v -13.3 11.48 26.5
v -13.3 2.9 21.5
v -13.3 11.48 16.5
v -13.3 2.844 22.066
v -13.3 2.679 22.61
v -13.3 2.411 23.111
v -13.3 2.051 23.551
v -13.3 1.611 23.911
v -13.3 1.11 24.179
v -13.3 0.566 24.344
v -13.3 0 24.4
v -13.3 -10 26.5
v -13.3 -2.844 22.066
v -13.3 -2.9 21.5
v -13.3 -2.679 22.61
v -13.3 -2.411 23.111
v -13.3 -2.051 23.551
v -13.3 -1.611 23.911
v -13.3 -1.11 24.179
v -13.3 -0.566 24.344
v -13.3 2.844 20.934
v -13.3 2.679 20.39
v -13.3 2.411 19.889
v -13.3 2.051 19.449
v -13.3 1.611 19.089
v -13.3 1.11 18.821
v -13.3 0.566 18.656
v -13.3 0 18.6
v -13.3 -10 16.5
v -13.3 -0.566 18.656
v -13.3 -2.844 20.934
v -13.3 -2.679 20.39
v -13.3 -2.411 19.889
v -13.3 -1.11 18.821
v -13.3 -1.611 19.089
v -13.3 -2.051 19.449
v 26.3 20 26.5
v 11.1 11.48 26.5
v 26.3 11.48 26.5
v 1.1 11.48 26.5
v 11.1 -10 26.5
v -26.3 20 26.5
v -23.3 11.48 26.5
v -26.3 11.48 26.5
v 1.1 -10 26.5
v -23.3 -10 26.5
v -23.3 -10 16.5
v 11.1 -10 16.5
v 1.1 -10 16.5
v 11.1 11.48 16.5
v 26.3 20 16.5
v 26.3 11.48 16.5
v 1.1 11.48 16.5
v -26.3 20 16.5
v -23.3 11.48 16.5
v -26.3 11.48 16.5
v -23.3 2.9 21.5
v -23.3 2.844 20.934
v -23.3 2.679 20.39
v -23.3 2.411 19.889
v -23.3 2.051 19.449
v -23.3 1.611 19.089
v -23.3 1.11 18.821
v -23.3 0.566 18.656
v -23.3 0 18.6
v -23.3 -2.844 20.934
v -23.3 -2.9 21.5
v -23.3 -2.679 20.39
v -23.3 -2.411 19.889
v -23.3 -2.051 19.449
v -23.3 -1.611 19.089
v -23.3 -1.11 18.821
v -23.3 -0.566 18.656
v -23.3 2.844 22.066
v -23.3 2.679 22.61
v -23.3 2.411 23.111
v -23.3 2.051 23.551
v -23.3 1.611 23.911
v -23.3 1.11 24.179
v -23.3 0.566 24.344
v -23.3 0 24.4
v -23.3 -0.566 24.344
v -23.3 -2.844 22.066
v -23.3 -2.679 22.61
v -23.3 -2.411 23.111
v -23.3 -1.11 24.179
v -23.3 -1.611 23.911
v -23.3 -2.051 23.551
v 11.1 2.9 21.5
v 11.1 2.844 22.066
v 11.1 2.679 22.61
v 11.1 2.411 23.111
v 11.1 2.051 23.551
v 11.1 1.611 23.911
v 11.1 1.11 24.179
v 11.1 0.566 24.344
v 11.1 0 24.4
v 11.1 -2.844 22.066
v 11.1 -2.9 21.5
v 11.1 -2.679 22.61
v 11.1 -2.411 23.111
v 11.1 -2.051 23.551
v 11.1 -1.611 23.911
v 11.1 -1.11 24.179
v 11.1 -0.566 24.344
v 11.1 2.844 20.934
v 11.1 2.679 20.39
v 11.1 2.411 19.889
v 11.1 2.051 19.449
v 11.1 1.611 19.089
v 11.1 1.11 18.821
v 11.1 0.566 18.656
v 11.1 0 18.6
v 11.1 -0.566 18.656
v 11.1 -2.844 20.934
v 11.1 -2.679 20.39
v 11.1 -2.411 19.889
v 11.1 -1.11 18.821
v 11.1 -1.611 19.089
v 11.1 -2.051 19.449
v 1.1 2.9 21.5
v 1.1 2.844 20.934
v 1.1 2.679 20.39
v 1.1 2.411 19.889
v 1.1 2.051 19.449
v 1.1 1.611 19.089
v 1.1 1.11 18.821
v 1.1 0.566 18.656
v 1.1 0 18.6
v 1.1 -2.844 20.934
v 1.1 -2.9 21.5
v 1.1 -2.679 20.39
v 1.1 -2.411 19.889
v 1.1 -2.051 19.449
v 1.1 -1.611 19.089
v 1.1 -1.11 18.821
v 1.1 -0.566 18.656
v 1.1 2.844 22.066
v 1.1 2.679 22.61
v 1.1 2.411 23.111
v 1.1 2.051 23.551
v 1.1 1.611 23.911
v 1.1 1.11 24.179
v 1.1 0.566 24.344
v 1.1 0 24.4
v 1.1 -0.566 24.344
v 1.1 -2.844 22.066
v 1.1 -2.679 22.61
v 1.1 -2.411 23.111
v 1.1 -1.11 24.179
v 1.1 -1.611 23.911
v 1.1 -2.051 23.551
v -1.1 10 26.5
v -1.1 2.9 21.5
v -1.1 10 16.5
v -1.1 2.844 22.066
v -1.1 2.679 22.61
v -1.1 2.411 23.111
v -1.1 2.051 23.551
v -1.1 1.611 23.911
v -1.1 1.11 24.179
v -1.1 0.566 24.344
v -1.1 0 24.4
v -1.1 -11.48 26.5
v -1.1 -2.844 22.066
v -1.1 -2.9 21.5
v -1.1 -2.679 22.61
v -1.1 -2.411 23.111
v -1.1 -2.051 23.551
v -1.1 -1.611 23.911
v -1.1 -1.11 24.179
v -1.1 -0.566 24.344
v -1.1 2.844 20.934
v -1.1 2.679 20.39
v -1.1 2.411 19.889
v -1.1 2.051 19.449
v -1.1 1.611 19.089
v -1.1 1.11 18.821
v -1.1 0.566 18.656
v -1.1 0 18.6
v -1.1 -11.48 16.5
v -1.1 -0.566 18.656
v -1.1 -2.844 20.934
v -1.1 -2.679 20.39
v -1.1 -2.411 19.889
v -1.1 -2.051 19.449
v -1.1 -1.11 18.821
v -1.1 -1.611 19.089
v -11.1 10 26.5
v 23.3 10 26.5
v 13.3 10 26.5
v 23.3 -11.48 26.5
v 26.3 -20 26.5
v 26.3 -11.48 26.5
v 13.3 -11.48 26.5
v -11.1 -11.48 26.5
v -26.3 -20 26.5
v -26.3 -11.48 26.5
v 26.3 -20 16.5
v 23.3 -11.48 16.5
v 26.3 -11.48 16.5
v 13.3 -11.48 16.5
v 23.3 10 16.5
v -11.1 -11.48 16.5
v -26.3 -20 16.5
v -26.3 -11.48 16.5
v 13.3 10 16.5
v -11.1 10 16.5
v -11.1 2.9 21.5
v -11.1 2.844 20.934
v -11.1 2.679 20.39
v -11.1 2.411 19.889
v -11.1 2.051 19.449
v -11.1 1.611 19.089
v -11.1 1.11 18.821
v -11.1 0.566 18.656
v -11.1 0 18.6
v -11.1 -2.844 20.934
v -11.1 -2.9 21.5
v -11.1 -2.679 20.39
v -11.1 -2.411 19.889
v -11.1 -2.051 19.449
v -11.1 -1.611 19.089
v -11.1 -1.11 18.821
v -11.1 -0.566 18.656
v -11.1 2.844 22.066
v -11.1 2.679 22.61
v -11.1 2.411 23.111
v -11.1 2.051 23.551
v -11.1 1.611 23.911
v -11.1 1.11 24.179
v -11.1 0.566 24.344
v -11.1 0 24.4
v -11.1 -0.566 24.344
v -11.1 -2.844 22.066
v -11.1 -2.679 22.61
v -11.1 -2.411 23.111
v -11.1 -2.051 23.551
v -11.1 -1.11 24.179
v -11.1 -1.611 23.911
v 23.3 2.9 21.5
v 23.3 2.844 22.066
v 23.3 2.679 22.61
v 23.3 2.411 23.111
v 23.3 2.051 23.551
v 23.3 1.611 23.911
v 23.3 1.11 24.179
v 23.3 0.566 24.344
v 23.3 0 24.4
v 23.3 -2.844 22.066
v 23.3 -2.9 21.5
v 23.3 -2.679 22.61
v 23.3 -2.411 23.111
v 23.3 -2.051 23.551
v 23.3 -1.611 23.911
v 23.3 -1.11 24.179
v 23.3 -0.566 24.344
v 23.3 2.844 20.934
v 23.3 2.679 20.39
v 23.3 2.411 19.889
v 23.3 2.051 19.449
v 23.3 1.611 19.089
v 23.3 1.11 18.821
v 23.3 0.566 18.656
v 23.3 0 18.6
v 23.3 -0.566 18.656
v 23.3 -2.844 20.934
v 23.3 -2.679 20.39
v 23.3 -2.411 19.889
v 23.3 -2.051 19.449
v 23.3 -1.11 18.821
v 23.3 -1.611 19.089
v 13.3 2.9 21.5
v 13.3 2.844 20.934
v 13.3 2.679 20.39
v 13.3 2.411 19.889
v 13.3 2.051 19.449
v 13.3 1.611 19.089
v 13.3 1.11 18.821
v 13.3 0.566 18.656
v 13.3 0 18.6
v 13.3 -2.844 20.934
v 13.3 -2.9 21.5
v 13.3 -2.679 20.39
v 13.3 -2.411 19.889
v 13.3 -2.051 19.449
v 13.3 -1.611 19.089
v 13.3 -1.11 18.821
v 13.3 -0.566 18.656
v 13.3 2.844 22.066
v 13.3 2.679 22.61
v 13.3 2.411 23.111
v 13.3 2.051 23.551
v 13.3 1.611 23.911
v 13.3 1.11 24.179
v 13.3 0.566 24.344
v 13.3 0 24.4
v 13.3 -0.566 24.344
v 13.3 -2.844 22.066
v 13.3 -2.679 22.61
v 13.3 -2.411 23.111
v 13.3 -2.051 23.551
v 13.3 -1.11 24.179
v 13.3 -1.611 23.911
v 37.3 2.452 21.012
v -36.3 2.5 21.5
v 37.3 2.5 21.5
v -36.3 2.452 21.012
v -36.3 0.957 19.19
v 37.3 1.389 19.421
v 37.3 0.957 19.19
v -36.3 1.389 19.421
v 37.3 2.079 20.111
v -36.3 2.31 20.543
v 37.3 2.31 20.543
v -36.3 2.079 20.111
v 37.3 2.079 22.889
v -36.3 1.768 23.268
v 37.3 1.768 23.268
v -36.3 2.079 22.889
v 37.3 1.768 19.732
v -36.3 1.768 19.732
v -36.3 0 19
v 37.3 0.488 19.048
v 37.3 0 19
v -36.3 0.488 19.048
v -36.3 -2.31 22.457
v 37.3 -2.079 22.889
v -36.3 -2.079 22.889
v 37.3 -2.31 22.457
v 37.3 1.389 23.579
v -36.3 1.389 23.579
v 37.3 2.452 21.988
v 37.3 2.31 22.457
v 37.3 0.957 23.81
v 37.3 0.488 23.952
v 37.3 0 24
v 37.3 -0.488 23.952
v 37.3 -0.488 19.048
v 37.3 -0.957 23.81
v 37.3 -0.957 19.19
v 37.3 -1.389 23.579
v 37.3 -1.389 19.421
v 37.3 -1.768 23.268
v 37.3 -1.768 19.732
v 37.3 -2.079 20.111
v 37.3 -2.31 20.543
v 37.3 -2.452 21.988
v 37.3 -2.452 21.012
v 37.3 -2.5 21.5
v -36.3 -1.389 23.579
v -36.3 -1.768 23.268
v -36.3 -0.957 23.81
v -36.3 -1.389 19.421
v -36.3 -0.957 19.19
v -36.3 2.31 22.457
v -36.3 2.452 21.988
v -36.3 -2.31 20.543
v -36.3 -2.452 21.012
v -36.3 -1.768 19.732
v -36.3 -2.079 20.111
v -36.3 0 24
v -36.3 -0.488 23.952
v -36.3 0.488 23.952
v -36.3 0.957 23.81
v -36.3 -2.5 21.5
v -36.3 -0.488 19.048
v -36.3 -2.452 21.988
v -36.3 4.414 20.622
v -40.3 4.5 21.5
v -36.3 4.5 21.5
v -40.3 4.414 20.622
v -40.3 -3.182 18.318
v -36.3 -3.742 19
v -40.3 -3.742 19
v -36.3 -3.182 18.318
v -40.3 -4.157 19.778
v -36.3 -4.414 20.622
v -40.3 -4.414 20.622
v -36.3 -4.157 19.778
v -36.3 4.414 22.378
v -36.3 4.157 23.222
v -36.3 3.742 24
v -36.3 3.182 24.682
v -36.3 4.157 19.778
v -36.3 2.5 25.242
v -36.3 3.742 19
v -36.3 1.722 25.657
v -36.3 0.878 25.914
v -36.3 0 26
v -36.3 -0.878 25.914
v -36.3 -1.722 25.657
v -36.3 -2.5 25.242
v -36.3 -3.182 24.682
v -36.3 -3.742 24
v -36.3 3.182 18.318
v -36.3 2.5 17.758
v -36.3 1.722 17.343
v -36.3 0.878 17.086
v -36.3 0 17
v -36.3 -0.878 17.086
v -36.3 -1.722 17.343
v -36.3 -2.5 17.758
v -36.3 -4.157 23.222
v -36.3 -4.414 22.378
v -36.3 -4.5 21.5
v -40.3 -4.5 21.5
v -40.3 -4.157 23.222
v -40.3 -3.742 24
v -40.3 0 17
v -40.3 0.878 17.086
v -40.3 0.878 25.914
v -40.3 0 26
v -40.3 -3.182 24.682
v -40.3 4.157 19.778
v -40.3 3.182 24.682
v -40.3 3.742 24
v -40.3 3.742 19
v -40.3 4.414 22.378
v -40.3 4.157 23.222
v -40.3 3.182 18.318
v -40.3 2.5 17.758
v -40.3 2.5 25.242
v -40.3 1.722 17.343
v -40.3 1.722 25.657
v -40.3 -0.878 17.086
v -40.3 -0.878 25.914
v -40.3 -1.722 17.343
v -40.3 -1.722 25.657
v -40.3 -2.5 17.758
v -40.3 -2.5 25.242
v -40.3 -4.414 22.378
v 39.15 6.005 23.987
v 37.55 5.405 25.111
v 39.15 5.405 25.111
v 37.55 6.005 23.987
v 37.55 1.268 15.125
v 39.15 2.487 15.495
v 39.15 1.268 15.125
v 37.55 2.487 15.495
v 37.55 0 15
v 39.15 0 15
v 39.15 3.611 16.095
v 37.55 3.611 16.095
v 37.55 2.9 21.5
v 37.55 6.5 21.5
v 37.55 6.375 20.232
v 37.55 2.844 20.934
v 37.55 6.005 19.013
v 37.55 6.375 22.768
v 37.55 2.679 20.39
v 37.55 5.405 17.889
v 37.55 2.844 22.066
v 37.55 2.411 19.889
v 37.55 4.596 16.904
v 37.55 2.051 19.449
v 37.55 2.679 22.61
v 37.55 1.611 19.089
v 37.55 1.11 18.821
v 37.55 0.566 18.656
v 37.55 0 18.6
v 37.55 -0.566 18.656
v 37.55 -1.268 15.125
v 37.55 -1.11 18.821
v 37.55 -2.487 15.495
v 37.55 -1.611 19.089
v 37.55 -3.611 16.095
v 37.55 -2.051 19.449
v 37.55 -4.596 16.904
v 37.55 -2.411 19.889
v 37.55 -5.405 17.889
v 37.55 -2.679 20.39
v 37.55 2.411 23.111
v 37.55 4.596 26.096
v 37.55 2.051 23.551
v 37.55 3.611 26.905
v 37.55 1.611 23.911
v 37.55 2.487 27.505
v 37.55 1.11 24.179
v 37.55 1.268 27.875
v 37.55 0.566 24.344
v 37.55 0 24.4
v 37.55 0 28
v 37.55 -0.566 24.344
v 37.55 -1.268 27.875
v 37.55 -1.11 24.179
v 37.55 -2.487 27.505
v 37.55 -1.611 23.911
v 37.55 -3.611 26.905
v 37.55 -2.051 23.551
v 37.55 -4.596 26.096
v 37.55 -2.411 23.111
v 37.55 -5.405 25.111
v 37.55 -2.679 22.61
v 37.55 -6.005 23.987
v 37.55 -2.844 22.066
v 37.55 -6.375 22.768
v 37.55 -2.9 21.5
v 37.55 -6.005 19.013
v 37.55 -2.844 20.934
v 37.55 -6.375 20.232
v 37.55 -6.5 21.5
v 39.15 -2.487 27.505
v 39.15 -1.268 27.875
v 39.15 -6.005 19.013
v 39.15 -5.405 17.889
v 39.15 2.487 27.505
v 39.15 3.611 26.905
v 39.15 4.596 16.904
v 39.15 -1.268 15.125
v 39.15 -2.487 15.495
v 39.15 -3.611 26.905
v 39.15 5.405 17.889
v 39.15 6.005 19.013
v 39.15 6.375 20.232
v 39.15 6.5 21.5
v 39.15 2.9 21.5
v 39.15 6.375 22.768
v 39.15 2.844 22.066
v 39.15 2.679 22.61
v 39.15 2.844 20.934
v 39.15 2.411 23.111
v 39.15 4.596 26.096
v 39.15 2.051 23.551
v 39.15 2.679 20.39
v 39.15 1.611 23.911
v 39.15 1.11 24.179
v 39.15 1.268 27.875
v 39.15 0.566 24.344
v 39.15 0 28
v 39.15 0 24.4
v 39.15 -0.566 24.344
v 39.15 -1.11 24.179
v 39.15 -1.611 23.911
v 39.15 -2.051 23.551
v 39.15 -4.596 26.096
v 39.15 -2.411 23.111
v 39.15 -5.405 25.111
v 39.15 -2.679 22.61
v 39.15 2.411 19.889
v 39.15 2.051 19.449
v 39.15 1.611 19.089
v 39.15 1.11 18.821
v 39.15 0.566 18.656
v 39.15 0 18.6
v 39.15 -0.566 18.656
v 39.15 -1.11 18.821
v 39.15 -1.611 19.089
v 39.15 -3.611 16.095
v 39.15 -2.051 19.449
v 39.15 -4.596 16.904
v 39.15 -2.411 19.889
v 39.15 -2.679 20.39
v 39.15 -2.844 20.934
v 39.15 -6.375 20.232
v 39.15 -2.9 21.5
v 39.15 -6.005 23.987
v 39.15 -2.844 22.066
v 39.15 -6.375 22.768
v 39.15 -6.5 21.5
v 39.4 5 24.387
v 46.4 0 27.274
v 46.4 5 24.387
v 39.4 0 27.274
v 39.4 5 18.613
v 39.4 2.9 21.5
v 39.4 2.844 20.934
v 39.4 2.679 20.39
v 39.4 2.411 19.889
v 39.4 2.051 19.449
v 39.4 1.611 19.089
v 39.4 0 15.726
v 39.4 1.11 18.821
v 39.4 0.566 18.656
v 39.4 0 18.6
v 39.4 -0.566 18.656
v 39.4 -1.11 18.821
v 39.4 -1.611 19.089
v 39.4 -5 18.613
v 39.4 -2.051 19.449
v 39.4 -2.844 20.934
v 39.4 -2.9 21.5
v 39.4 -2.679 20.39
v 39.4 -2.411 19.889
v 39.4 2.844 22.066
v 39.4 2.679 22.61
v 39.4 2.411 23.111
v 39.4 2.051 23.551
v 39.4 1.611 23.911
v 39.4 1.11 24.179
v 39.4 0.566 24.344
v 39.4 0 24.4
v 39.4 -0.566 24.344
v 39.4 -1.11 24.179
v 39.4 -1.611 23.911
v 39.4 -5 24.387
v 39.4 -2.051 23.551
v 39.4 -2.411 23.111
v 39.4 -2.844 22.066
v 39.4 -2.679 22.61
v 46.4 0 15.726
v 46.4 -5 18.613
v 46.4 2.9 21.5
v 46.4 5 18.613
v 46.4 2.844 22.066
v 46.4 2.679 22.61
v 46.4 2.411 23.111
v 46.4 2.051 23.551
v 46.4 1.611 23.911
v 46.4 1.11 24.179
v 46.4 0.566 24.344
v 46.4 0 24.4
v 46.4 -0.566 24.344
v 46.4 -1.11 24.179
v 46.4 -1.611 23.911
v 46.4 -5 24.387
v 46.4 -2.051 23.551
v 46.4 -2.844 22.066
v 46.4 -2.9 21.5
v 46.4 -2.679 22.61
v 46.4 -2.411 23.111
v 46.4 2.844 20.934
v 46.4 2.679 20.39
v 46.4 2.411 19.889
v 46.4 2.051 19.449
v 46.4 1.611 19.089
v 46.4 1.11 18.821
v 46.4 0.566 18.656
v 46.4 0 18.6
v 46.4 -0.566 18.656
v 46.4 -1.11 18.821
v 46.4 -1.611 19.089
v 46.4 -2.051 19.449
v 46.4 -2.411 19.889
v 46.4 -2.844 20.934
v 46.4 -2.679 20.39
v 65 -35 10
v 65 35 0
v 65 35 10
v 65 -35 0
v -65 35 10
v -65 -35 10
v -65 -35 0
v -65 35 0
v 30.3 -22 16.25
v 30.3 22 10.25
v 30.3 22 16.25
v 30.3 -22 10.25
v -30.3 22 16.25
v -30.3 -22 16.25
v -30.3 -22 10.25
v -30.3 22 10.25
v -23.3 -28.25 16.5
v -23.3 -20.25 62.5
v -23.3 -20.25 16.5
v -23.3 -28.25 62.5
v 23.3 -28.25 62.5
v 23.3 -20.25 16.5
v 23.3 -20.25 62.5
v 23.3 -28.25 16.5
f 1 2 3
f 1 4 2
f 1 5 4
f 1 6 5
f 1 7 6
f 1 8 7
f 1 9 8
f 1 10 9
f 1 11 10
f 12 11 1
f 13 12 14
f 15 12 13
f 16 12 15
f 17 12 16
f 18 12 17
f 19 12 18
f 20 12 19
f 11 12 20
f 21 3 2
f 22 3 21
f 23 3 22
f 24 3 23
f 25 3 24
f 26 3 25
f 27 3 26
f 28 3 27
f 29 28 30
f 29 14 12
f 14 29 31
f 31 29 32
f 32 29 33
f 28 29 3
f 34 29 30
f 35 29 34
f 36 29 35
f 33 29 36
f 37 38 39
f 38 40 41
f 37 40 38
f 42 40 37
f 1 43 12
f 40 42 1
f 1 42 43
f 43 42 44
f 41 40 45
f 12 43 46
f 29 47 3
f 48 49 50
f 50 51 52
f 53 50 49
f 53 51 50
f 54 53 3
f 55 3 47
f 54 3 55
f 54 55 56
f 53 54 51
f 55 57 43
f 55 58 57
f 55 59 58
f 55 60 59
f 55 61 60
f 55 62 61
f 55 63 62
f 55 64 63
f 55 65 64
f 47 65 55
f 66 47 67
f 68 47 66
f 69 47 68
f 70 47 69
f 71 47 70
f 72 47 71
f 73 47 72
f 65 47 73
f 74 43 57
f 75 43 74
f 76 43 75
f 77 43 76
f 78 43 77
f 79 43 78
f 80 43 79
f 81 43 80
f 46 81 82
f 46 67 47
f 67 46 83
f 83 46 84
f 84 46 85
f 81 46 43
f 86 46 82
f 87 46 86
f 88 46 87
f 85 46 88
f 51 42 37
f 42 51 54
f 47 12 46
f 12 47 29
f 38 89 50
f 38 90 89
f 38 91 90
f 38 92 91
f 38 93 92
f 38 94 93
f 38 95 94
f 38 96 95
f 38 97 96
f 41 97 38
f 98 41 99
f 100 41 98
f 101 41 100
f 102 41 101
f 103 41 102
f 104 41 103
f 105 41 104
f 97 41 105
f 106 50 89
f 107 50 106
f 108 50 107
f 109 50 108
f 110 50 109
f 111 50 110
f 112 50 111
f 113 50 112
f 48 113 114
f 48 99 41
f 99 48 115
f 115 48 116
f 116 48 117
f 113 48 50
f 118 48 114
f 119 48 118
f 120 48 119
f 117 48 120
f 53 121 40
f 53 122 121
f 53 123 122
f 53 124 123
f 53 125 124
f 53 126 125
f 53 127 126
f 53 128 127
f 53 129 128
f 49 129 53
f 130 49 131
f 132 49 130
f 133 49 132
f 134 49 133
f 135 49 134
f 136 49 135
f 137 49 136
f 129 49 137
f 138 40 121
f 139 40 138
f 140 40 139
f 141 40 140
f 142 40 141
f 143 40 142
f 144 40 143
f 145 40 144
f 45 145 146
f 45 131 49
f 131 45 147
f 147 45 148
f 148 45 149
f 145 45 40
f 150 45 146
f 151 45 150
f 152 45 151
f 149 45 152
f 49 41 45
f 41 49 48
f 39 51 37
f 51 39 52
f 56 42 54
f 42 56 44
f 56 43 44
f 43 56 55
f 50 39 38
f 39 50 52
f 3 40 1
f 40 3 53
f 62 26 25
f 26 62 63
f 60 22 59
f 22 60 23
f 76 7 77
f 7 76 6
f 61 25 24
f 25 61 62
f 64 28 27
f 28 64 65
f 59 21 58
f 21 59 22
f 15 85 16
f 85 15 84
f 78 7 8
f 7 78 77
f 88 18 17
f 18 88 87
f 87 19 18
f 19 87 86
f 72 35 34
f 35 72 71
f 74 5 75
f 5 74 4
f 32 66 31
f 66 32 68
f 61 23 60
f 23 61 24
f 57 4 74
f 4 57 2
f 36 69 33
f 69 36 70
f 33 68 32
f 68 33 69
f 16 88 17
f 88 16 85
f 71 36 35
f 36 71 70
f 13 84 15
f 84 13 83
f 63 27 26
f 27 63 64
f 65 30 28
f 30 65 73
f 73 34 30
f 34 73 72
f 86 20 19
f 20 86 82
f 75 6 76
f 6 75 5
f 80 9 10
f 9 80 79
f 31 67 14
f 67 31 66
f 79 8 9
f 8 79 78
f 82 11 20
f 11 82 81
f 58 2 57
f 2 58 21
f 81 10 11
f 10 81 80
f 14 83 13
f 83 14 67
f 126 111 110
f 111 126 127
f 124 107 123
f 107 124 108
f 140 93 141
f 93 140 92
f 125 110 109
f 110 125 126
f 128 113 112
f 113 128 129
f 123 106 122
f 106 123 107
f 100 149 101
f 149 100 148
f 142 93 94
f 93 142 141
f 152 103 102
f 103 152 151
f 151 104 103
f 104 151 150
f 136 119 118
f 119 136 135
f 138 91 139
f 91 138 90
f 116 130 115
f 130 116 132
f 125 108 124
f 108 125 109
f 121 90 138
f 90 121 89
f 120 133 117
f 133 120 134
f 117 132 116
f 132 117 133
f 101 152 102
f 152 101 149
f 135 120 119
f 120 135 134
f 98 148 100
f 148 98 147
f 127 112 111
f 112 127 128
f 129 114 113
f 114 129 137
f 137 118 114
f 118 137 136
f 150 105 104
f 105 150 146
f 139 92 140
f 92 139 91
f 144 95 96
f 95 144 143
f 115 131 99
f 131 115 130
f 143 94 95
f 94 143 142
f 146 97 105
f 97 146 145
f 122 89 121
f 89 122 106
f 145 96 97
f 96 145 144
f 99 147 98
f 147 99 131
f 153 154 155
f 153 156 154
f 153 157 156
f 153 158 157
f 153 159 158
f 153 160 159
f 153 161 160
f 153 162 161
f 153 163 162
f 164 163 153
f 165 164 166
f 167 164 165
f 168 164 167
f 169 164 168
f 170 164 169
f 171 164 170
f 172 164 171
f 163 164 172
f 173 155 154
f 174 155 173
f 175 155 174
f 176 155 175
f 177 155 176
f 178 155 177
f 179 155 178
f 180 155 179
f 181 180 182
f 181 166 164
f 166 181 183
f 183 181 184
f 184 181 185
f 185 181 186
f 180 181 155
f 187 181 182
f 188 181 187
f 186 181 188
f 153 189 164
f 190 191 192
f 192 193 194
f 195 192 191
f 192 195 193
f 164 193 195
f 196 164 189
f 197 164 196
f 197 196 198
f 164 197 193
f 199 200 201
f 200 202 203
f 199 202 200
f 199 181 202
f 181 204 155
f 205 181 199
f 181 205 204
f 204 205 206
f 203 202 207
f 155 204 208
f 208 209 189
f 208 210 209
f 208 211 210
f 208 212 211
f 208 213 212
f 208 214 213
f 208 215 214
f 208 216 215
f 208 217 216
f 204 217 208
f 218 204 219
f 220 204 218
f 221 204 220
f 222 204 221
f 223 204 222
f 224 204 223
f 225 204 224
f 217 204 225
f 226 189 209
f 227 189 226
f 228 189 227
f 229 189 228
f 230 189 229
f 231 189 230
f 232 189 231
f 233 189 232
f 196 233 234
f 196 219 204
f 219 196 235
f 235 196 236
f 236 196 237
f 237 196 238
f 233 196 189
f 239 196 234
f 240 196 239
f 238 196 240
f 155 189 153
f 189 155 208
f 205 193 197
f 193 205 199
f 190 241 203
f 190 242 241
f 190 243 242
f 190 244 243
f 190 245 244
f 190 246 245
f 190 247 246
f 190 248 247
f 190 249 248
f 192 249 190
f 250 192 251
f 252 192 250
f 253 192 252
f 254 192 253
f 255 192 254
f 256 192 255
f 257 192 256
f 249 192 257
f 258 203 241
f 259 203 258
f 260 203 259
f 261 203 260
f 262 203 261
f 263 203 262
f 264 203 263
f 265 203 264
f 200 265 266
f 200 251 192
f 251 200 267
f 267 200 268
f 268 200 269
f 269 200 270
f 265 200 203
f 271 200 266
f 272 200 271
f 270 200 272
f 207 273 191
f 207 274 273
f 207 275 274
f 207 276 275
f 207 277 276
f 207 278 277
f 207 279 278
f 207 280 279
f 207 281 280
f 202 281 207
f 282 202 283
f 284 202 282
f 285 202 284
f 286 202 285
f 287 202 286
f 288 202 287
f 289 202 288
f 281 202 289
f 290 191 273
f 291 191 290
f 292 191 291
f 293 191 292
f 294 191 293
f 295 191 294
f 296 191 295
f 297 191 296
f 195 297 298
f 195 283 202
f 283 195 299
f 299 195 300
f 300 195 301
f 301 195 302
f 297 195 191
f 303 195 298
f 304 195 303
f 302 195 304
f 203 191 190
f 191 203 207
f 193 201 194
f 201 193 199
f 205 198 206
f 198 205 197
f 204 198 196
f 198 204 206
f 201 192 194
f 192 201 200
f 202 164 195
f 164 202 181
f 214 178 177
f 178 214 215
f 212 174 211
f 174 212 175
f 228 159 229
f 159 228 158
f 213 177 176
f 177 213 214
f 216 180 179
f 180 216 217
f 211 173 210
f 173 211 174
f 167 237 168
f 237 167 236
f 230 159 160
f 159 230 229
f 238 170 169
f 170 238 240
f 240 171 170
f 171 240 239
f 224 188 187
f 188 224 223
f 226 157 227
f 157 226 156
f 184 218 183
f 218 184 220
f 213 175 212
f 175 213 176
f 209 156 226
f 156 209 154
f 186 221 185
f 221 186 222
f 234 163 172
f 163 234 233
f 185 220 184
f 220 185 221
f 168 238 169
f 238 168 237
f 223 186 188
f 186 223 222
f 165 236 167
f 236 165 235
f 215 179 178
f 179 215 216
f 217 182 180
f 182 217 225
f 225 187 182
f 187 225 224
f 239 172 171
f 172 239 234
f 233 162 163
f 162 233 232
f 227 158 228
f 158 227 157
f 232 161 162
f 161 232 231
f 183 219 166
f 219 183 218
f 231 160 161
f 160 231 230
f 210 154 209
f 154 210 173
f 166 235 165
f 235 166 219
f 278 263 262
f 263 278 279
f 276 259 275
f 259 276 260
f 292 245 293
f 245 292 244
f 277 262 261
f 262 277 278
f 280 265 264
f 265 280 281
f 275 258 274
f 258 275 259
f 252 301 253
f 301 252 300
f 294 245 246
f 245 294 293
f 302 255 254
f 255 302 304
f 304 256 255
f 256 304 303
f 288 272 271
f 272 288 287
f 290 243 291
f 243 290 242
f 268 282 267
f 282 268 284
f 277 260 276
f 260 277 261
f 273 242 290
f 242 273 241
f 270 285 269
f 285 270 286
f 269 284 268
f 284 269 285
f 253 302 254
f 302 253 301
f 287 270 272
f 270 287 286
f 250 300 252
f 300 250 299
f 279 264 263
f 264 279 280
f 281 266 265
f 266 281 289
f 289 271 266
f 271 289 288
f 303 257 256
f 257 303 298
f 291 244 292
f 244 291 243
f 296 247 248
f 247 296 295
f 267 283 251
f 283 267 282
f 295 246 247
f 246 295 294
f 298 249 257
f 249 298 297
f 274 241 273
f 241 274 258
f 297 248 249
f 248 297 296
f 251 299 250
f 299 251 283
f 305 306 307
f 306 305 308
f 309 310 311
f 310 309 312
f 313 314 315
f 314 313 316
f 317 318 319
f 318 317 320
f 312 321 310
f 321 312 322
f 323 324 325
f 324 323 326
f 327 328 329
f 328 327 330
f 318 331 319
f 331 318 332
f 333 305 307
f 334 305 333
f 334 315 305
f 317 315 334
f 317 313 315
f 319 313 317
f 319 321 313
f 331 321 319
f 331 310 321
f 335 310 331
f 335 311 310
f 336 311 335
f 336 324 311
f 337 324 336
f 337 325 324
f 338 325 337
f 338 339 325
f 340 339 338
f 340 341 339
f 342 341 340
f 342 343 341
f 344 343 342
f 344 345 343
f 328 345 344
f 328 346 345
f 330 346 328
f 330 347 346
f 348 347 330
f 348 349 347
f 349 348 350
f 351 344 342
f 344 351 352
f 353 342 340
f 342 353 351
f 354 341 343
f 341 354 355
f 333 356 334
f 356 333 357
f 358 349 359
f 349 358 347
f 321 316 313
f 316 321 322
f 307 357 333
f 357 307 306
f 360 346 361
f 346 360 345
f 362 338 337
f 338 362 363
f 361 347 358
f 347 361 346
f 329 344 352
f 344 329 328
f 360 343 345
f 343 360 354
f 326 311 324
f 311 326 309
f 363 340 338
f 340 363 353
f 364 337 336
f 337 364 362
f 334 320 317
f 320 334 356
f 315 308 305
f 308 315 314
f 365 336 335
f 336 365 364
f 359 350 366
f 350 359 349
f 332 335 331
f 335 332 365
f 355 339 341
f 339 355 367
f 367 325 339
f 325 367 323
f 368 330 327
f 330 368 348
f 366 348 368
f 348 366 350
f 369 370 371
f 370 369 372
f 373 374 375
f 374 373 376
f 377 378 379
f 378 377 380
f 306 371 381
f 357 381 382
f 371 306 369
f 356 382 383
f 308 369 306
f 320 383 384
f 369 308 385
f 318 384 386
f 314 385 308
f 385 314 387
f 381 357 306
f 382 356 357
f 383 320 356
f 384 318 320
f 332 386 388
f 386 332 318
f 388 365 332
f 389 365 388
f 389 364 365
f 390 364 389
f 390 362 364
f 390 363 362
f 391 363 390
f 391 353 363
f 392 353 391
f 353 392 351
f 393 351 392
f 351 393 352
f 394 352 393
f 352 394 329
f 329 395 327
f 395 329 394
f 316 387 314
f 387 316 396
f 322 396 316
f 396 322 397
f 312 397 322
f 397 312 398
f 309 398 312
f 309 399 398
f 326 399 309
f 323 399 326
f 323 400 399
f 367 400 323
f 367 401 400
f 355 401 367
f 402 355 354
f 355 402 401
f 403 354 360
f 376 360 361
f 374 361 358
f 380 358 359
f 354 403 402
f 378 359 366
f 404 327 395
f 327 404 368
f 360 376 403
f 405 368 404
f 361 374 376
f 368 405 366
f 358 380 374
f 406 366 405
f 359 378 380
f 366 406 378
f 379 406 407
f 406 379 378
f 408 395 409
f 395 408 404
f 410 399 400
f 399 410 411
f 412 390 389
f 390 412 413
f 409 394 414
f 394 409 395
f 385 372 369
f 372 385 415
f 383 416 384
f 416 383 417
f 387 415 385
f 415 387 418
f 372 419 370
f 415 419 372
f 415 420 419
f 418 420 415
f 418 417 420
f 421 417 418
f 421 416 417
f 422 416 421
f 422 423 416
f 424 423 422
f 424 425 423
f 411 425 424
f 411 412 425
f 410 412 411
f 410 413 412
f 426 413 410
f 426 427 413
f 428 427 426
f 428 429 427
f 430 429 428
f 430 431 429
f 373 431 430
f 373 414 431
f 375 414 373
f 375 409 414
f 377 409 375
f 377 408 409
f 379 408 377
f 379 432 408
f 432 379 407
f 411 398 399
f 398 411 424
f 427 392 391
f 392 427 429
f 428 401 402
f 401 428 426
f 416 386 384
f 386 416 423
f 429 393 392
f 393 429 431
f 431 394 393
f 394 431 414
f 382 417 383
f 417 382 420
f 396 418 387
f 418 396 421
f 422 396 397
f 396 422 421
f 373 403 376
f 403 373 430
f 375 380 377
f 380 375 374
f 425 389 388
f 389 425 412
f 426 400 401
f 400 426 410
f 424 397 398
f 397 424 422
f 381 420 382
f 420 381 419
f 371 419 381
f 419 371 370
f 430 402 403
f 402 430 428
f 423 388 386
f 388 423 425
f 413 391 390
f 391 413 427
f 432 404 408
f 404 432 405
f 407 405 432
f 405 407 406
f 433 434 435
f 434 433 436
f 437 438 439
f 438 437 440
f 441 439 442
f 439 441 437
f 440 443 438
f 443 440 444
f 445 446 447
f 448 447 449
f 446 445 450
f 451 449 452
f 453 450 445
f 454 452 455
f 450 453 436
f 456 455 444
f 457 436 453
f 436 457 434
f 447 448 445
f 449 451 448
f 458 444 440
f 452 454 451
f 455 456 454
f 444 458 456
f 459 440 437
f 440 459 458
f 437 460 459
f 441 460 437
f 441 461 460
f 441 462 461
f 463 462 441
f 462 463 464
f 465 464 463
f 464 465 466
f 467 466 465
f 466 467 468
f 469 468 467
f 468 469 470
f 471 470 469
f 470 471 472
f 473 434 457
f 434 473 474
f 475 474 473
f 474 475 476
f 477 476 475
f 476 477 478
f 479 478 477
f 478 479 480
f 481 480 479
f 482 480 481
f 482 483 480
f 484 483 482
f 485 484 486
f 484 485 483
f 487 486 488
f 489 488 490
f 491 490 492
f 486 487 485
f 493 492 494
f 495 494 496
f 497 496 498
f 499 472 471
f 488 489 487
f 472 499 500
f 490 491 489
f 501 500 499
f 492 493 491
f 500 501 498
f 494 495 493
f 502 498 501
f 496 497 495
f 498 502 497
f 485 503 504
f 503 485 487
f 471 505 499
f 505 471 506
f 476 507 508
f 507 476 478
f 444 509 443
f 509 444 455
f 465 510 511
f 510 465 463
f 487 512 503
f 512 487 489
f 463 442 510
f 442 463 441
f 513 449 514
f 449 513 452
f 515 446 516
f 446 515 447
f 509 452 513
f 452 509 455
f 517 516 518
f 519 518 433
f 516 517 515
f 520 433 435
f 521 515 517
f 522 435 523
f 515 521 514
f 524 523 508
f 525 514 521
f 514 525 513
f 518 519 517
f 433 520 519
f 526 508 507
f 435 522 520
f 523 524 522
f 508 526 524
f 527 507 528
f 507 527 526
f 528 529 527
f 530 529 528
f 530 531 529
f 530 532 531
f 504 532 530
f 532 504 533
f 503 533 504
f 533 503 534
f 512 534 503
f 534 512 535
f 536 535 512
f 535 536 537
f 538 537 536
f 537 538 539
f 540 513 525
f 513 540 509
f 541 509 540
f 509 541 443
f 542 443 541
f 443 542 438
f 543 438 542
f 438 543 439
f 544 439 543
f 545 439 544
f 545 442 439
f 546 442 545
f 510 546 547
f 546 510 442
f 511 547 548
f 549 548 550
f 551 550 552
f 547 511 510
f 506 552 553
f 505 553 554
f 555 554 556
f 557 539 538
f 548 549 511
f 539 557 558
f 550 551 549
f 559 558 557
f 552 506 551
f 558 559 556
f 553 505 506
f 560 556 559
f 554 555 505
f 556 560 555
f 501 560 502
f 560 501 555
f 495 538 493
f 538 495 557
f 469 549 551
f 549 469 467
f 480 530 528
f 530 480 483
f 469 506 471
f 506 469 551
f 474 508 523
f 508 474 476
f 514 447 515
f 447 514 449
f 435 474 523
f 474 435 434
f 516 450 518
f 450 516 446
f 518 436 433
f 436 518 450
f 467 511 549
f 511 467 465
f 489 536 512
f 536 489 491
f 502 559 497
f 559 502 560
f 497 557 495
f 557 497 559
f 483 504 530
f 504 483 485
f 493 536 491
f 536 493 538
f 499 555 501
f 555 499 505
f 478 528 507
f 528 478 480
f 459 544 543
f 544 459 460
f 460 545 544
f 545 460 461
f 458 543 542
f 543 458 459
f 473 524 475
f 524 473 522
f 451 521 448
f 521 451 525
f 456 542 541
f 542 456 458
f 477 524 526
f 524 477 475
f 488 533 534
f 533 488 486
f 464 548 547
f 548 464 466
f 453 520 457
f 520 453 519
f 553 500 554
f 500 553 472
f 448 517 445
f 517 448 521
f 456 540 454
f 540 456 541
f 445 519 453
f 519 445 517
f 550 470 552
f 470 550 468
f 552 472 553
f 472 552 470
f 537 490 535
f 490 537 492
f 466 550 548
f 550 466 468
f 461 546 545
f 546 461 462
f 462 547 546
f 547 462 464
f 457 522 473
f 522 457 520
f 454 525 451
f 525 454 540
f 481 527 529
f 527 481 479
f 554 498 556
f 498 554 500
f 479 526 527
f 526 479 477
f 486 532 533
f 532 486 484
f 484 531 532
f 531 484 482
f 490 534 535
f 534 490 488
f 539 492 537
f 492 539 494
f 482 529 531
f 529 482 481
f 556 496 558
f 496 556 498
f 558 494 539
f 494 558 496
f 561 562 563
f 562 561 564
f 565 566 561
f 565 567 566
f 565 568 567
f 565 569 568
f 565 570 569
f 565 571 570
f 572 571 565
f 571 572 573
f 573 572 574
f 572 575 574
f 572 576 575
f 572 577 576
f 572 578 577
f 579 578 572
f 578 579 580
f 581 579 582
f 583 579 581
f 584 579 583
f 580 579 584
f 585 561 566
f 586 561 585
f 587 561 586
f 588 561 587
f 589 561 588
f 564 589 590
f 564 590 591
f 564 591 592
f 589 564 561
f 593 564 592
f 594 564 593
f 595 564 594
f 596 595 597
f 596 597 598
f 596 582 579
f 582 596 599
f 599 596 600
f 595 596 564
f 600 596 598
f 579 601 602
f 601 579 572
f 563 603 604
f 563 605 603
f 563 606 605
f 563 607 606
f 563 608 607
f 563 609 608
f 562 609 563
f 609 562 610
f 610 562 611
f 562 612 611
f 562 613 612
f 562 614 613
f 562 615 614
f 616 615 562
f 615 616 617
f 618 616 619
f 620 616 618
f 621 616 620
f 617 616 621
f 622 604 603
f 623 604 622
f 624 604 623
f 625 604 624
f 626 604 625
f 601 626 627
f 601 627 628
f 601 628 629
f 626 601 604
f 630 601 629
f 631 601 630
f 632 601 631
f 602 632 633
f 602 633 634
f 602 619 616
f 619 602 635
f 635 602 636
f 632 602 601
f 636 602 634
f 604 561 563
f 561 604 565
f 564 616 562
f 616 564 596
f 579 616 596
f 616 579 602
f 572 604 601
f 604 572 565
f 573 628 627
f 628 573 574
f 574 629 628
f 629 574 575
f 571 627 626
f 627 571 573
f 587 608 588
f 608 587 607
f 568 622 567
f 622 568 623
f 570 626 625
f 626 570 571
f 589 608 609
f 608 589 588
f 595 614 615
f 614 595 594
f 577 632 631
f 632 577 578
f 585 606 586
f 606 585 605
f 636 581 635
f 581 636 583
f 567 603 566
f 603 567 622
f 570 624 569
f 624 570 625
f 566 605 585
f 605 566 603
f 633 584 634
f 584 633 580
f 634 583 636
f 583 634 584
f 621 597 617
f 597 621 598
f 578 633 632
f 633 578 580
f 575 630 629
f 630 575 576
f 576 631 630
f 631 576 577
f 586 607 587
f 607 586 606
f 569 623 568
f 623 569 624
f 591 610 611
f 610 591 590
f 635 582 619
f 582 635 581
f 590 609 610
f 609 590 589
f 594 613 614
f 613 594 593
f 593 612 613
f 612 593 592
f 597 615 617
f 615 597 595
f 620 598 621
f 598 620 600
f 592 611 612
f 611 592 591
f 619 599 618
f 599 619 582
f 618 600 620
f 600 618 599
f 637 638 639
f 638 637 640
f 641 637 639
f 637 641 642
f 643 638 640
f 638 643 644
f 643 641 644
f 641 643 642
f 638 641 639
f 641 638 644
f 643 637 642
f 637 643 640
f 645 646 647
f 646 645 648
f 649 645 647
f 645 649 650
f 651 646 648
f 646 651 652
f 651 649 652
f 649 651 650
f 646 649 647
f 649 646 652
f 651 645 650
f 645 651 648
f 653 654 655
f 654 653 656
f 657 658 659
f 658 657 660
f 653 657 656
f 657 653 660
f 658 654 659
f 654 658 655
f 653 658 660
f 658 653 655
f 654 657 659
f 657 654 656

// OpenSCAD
$fn = 32;

// ------------------------------------------------------------------------
// Comb hinge with flap: leaf 52.6 x 20 mm, pin d5, flap 46 mm
// Every part is its own module, assembly() places every instance.
// ------------------------------------------------------------------------

// --- part 1 ---
module hinge_bed() {
  difference() {
    translate([-65, -35, 0]) cube([130, 70, 10]);
  }
}

// --- part 2 ---
module hinge_riser() {
  difference() {
    translate([-30.3, -22, 0]) cube([60.6, 44, 6]);
  }
}

// --- part 3 ---
module hinge_leaf_a() {
  difference() {
    union() {
      translate([-23.3, -10, -5]) cube([10, 30, 10]);
      translate([1.1, -10, -5]) cube([10, 30, 10]);
      translate([-26.3, 11.48, -5]) cube([52.6, 8.52, 10]);
    }
    translate([-18.3, 0, 0]) rotate([0, 90, 0]) cylinder(h = 12, d = 5.8, center = true);
    translate([6.1, 0, 0]) rotate([0, 90, 0]) cylinder(h = 12, d = 5.8, center = true);
  }
}

// --- part 4 ---
module hinge_leaf_b() {
  difference() {
    union() {
      translate([-11.1, -20, -5]) cube([10, 30, 10]);
      translate([13.3, -20, -5]) cube([10, 30, 10]);
      translate([-26.3, -20, -5]) cube([52.6, 8.52, 10]);
    }
    translate([-6.1, 0, 0]) rotate([0, 90, 0]) cylinder(h = 12, d = 5.8, center = true);
    translate([18.3, 0, 0]) rotate([0, 90, 0]) cylinder(h = 12, d = 5.8, center = true);
  }
}

// --- part 5 ---
module hinge_flap() {
  difference() {
    translate([-23.3, -23, 0]) cube([46.6, 46, 8]);
  }
}

// --- part 6 ---
module hinge_pin() {
  rotate([0, 90, 0]) cylinder(h = 74.6, d = 5, center = true);
  translate([-40.3, 0, 0]) rotate([0, 90, 0]) cylinder(h = 4, d = 9);
}

// --- part 7 ---
module pin_washer() {
  difference() {
      translate([0, 0, 0]) cylinder(h = 1.6, d = 13);
      translate([0, 0, -1]) cylinder(h = 3.6, d = 5.8);
    }
}

// --- part 8 ---
module pin_nut() {
  difference() {
    linear_extrude(height = 7) polygon(points = [[5.774, 0], [2.887, 5], [-2.887, 5], [-5.774, 0], [-2.887, -5], [2.887, -5]]);
    translate([0, 0, -1]) cylinder(h = 9, d = 5.8);
  }
}

// --- assembly ---
module assembly() {
  color([0.80, 0.24, 0.20]) translate([0, 0, 0]) rotate([0, 0, 0]) hinge_bed();
  color([0.20, 0.45, 0.75]) translate([0, 0, 10.25]) rotate([0, 0, 0]) hinge_riser();
  color([0.25, 0.62, 0.32]) translate([0, 0, 21.5]) rotate([0, 0, 0]) hinge_leaf_a();
  color([0.92, 0.70, 0.18]) translate([0, 0, 21.5]) rotate([0, 0, 0]) hinge_leaf_b();
  color([0.58, 0.35, 0.70]) translate([0, -20.25, 39.5]) rotate([90, 0, 0]) hinge_flap();
  color([0.16, 0.66, 0.66]) translate([0, 0, 21.5]) rotate([0, 0, 0]) hinge_pin();
  color([0.85, 0.48, 0.18]) translate([37.55, 0, 21.5]) rotate([0, 90, 0]) pin_washer();
  color([0.55, 0.60, 0.65]) translate([39.4, 0, 21.5]) rotate([0, 90, 0]) pin_nut();
}

assembly();
